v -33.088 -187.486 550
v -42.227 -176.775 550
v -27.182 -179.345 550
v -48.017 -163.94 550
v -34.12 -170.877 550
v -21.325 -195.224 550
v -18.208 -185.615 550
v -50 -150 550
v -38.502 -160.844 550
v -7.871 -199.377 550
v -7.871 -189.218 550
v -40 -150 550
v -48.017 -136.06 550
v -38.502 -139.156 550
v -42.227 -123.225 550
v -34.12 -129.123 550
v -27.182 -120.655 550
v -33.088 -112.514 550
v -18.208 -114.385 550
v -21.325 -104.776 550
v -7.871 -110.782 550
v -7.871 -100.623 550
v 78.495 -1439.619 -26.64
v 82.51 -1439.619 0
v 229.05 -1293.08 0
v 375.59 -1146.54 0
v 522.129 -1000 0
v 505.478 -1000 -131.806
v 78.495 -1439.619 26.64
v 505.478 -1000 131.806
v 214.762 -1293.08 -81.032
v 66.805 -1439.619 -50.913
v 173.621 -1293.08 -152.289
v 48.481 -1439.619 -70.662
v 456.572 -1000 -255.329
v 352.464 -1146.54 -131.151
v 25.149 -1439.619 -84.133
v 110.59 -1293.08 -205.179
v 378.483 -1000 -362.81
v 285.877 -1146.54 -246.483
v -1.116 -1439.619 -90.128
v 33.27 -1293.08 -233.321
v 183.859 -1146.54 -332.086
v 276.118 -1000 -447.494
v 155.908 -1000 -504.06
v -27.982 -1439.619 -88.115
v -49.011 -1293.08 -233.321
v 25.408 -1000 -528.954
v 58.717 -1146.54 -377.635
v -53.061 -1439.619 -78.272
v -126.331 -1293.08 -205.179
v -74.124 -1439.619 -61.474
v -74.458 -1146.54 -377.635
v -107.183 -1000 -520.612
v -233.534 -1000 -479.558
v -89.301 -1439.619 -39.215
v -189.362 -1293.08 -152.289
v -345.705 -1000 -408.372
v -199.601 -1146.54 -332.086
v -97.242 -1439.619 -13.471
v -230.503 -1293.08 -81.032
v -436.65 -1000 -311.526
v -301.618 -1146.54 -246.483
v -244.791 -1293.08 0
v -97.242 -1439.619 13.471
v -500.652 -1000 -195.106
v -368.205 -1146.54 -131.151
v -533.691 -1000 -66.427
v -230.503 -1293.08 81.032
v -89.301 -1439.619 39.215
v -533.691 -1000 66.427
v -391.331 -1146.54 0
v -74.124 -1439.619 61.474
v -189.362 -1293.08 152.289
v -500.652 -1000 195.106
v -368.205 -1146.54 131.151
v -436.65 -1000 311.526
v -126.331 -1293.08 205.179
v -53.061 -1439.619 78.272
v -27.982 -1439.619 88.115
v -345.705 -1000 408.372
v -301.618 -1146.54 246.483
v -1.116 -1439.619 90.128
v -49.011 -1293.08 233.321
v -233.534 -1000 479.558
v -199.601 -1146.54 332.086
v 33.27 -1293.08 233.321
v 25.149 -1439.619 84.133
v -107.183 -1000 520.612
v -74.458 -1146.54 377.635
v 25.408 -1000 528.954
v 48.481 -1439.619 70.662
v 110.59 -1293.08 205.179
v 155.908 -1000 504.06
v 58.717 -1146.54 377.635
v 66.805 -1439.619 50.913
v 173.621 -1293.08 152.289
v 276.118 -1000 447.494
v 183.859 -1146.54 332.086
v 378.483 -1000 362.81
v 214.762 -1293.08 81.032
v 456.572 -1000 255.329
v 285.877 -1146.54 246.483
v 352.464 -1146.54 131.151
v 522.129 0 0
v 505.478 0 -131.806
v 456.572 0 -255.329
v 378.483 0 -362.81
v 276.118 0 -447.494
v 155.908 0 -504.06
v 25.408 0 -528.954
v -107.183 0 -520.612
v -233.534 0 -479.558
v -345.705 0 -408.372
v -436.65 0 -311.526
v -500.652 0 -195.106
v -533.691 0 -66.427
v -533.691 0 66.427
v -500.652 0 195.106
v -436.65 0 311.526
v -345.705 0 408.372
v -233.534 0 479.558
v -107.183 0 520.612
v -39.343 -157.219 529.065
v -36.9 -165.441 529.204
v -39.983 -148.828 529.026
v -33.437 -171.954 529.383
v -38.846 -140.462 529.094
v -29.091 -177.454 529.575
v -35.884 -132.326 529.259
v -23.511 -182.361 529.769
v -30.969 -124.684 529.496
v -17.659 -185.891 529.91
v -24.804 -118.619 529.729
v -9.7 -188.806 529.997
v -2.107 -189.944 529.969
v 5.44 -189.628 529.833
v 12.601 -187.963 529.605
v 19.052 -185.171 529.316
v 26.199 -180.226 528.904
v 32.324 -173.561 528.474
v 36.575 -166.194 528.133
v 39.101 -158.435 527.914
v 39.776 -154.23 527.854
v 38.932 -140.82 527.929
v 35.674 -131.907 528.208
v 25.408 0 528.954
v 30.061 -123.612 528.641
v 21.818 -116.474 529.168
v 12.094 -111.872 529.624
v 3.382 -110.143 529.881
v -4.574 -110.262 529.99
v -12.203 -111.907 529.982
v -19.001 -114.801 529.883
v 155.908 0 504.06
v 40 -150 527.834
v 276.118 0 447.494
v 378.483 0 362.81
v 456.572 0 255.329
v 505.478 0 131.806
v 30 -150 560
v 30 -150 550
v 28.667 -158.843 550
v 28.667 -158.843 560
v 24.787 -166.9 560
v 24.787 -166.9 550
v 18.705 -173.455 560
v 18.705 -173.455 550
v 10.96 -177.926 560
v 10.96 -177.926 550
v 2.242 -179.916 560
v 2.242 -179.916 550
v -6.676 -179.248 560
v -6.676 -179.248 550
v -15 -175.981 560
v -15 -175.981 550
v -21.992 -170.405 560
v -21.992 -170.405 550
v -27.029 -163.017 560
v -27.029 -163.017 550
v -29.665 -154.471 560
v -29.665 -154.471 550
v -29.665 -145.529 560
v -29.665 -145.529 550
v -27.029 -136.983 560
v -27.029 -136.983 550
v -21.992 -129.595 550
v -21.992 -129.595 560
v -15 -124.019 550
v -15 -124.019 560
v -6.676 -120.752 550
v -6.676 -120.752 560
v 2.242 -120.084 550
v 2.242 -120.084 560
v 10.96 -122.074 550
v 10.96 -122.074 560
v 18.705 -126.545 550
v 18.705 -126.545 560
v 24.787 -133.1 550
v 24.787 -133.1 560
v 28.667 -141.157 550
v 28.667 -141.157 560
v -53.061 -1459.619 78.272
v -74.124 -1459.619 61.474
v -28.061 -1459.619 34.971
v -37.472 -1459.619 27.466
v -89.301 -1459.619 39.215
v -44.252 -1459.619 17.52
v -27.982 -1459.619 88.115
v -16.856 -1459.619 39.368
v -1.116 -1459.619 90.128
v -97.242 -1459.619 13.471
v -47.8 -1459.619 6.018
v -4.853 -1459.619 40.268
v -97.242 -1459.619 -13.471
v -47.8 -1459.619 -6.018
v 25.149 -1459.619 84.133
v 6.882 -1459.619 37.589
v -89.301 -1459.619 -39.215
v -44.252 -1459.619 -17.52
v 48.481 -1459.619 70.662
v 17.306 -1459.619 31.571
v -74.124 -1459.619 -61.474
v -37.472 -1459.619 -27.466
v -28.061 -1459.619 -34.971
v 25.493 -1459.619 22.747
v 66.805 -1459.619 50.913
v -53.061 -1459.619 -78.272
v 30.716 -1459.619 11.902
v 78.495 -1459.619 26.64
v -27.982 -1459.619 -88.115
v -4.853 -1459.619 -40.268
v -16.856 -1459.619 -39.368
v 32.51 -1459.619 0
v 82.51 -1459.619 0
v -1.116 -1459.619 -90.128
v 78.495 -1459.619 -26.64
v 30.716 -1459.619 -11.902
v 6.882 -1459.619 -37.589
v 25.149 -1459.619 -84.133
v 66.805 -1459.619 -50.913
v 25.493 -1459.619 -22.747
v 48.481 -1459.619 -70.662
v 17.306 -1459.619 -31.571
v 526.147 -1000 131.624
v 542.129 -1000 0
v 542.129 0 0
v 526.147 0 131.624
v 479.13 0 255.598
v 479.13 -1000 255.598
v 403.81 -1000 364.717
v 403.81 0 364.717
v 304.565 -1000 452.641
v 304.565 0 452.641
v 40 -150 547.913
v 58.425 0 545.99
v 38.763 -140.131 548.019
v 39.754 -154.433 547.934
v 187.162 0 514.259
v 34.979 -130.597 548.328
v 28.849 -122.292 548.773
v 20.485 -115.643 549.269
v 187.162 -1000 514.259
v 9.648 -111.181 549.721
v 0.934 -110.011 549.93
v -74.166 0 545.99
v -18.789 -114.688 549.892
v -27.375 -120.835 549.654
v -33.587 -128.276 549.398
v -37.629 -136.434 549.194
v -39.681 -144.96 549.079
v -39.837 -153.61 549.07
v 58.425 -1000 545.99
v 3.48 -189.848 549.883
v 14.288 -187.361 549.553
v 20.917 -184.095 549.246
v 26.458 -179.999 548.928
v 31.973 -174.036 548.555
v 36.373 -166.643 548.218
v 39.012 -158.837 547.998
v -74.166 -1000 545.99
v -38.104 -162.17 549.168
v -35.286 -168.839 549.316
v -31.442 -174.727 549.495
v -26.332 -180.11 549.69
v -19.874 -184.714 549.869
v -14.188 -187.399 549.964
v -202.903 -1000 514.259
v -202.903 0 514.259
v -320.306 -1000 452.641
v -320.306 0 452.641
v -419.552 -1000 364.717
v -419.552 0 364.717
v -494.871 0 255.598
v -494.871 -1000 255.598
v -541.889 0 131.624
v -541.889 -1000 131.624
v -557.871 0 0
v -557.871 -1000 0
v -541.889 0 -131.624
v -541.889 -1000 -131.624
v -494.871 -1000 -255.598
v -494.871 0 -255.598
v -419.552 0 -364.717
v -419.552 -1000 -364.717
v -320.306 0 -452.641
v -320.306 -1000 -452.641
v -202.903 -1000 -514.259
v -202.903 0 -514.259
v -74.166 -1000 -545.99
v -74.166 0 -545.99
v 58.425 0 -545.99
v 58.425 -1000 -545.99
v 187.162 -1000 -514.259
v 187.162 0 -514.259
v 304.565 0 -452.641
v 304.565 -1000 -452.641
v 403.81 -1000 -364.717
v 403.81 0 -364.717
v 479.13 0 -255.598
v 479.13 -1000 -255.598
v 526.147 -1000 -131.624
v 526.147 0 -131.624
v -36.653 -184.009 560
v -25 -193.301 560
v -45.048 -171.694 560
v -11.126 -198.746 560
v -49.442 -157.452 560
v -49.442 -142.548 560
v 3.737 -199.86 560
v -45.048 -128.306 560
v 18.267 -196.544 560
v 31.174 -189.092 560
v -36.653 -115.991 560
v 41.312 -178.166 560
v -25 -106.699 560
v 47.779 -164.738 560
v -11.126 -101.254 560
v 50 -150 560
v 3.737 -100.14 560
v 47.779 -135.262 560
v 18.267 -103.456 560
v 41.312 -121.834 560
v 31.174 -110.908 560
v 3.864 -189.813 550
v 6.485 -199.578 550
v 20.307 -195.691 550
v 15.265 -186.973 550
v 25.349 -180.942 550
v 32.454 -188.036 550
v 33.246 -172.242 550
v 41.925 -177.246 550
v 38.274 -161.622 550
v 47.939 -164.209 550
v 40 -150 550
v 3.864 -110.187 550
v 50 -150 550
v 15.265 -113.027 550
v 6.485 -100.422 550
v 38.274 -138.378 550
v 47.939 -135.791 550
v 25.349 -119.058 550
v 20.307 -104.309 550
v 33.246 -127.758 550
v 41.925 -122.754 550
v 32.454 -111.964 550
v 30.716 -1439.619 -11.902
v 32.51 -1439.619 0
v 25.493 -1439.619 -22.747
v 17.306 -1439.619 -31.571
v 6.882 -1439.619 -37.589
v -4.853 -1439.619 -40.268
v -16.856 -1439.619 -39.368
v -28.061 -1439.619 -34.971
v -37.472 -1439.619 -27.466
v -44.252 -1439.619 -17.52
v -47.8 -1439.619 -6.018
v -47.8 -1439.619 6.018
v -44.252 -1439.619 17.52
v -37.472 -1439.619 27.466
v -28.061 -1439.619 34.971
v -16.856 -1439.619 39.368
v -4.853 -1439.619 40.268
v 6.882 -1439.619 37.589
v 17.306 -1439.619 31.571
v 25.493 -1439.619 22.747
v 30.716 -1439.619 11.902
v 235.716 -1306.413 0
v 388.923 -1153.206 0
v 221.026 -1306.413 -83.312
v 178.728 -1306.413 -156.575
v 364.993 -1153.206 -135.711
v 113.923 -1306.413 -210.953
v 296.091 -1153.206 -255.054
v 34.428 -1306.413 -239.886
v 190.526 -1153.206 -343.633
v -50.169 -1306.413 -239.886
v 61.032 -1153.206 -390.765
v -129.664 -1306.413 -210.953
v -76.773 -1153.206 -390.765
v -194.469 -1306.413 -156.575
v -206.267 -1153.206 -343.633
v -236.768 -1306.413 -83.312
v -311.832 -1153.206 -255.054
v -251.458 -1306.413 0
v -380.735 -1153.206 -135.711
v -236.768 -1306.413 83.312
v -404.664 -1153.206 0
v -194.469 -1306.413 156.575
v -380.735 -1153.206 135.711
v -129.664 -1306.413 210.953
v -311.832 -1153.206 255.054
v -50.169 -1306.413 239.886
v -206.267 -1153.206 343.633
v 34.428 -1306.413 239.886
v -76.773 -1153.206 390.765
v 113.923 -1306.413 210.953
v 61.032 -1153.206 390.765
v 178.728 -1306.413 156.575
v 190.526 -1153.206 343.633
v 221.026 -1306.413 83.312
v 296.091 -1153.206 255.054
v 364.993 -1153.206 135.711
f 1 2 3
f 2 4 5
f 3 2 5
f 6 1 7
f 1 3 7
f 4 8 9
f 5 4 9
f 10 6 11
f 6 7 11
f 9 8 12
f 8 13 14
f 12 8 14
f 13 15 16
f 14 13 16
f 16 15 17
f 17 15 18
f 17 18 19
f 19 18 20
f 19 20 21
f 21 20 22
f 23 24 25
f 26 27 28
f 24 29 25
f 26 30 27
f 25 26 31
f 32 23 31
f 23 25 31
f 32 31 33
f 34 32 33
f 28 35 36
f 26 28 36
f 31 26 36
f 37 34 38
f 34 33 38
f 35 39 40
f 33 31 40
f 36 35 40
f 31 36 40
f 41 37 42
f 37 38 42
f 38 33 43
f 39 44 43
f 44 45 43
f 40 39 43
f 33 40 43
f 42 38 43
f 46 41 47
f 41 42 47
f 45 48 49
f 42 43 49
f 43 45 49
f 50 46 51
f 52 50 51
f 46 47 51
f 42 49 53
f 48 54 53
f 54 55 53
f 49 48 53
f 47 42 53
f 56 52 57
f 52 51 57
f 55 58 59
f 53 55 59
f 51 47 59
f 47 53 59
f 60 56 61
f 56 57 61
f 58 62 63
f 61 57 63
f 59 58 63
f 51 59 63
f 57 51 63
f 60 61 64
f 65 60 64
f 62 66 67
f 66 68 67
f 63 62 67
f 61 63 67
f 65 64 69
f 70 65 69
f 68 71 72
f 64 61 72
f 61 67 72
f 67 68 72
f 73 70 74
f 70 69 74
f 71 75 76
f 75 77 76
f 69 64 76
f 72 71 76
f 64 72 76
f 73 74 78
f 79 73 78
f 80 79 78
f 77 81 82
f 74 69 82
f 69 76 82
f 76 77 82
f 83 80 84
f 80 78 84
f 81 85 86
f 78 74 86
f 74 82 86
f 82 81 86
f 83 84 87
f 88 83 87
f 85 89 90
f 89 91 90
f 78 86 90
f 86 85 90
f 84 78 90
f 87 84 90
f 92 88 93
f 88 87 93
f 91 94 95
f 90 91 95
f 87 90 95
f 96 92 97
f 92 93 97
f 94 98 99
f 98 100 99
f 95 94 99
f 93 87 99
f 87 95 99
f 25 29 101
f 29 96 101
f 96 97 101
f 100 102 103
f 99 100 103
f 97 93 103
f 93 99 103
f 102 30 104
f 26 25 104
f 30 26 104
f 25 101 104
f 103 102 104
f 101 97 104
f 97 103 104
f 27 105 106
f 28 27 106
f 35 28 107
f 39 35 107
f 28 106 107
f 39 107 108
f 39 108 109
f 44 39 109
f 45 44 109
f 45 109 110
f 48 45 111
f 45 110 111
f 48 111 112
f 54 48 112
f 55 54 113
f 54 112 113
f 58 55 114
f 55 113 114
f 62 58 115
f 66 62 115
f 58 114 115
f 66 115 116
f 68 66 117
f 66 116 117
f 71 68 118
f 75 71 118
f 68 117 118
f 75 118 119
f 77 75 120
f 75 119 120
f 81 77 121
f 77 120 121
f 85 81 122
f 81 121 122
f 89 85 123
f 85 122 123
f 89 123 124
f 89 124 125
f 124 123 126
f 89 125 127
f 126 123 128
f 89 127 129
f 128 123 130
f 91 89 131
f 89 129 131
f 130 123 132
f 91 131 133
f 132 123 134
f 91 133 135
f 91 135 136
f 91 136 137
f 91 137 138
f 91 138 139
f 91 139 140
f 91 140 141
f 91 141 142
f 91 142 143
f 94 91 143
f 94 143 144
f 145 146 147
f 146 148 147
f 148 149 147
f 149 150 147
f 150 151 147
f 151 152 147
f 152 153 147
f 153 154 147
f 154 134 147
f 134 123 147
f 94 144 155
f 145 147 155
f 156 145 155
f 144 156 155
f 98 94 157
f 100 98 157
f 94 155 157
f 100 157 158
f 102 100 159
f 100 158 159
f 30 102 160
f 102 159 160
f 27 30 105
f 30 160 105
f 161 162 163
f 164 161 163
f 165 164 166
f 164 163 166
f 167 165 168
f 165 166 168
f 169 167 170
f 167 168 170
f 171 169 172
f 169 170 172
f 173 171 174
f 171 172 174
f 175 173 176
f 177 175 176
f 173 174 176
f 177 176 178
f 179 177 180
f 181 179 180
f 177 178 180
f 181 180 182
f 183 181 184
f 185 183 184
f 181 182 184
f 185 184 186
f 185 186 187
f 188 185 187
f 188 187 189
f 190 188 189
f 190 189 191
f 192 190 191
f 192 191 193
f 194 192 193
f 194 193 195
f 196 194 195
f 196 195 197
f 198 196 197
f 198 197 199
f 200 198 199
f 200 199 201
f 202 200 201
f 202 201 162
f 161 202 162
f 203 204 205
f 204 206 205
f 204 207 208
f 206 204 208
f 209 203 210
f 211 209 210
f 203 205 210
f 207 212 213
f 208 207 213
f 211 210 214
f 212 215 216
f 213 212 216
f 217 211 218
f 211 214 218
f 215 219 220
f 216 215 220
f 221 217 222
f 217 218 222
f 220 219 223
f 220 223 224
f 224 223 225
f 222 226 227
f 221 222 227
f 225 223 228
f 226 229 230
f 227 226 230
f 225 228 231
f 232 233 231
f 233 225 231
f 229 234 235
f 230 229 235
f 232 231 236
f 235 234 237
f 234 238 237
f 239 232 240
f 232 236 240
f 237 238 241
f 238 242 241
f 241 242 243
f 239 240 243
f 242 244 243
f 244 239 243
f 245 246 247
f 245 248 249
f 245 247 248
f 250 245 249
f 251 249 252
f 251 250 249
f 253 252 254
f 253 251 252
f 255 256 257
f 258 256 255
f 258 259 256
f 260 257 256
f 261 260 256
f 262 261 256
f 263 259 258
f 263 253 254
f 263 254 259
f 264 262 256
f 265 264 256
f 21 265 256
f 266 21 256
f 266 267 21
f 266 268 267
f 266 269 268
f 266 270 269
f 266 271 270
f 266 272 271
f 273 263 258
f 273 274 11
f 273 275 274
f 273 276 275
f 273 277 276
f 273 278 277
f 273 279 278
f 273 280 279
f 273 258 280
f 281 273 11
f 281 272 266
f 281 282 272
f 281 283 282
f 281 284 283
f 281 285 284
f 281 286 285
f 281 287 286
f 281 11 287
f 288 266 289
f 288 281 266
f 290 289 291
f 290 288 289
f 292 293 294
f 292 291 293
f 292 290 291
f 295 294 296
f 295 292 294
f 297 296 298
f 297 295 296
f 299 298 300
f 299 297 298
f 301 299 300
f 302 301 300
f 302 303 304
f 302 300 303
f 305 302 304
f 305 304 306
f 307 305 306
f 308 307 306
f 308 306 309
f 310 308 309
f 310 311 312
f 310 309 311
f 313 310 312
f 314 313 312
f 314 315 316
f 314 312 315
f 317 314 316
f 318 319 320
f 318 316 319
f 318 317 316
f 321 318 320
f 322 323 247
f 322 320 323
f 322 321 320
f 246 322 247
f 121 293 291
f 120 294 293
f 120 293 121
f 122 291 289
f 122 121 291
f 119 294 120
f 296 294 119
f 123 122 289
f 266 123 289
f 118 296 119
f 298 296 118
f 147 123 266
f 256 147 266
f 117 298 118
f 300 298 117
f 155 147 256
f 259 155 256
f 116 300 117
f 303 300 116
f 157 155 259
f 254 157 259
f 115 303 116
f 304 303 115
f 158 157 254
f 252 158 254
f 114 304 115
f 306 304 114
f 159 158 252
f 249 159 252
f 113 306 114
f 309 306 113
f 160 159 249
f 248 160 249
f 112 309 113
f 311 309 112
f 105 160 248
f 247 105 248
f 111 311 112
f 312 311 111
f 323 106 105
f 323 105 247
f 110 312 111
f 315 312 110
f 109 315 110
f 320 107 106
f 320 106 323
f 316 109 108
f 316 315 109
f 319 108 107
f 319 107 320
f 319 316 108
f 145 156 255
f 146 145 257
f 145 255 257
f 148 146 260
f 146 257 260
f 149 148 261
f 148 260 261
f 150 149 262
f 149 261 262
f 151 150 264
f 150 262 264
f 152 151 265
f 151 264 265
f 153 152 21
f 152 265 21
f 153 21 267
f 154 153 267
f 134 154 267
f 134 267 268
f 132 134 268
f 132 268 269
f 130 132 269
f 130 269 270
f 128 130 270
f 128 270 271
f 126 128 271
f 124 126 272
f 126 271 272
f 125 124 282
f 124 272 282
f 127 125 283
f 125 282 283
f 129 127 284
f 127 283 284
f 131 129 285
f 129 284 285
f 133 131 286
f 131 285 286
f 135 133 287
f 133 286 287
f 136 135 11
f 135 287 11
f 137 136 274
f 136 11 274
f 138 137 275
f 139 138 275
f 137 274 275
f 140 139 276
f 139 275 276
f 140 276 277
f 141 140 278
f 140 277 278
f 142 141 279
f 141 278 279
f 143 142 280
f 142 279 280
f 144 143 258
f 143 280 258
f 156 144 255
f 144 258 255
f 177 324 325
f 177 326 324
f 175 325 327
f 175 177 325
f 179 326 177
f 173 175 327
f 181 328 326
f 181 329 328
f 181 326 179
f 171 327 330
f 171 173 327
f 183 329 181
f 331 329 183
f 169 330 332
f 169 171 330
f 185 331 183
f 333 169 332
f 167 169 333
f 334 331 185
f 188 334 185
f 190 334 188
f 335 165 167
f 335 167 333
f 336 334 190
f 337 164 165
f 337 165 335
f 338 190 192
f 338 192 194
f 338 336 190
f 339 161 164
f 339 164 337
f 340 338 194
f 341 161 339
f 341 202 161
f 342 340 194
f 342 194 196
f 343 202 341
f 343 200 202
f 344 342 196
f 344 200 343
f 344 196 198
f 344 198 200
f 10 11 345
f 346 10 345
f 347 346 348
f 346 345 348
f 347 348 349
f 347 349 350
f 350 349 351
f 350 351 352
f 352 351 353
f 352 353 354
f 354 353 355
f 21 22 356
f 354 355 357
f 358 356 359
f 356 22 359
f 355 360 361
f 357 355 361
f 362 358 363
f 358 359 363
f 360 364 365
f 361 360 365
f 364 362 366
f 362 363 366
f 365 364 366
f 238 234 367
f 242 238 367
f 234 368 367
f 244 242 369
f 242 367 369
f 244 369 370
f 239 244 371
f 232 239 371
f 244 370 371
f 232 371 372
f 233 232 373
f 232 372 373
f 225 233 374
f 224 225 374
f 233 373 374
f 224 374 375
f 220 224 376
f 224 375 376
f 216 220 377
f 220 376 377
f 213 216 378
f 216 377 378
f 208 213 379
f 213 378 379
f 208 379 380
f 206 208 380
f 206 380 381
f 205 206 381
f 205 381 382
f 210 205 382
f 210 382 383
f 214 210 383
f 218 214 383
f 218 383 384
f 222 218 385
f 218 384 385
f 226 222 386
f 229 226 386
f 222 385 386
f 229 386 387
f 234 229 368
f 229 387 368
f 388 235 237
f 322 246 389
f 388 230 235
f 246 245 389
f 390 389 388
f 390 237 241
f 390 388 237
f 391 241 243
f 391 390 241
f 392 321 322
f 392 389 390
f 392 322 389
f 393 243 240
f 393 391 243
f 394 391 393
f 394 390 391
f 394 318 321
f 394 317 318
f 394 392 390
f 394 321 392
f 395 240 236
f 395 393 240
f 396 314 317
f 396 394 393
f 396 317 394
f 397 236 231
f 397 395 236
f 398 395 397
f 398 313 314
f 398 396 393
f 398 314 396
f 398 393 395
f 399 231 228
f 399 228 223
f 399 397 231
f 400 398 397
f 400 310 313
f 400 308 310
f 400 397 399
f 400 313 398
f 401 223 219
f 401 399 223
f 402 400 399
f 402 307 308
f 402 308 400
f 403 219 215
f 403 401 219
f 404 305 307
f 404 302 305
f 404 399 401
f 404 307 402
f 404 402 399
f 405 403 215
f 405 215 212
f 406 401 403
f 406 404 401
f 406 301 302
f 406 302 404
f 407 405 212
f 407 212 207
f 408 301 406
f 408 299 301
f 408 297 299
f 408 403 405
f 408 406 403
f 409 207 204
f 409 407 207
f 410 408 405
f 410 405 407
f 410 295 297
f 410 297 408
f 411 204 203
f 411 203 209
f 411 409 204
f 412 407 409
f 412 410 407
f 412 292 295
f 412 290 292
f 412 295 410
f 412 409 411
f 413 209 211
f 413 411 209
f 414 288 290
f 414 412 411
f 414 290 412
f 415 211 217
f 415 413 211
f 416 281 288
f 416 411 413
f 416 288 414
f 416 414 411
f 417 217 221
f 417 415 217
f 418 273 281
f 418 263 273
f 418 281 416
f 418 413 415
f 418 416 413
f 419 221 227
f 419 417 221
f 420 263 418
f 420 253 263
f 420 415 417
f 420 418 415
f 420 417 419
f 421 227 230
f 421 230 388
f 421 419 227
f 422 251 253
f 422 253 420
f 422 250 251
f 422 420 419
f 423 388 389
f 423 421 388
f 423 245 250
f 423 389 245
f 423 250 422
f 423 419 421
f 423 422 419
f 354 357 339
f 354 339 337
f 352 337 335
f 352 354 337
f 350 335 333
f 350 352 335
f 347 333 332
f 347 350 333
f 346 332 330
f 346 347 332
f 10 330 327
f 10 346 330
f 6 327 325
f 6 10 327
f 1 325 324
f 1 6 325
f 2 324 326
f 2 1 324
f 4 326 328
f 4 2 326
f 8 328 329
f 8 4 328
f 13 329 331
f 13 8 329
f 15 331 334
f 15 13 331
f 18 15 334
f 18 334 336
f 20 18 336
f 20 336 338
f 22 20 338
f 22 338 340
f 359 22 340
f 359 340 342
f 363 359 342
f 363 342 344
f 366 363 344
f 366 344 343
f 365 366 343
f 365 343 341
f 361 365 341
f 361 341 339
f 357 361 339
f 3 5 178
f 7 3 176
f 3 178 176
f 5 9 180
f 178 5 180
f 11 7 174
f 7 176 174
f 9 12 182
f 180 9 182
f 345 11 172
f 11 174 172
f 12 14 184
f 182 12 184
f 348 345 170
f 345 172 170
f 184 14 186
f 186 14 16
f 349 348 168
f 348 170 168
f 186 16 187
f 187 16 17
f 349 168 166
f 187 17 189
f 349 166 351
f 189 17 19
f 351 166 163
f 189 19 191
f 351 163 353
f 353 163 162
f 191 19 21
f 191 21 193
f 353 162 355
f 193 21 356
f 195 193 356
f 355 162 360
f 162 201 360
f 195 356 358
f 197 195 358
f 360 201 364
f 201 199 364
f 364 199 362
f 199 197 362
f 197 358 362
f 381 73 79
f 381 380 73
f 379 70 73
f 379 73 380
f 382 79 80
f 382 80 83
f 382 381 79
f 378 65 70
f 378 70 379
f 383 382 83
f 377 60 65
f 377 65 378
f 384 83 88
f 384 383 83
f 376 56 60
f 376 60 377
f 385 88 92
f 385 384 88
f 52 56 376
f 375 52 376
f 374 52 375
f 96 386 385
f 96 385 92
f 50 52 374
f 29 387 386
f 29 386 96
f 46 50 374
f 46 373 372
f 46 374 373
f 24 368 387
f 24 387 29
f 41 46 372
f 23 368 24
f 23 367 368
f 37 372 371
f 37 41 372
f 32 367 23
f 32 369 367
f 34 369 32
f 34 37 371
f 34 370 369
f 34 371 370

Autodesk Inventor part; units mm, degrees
ref_plane "YZ Plane" through (0, 0, 0) normal (1, 0, 0) x (0, 1, 0)
sketch "Sketch1" plane through (0, 0, 0) normal (0, 0, 1) x (1, 0, 0)
  line L0 (542.1294, 0) -> (542.1294, -1000)
  line L1 (542.1294, -1000) -> (82.51, -1459.6194)
  line L2 (-7.8706, -896.0873) -> (-7.8706, -498.6597)
  line L3 (542.1294, 0) -> (542.1294, 0)
  line L4 (82.51, -1459.6194) -> (32.51, -1459.6194)
  line L5 (32.51, -1459.6194) -> (32.51, -1439.6194)
  line L6 (32.51, -1439.6194) -> (82.51, -1439.6194)
  line L7 (82.51, -1439.6194) -> (522.1294, -1000)
  line L8 (522.1294, -1000) -> (522.1294, 0)
  line L9 (522.1294, 0) -> (542.1294, 0)
  point P0 (0, 0)
  dimension "d0" = 1000
  dimension "d1" = 650
  dimension "d2" = 0
  dimension "d3" = 135
  dimension "d4" = 550
  dimension "d29" = 0
  dimension "d30" = 0
  dimension "d31" = 50
  dimension "d41" = 20
ref_plane "Work Plane6" through (-566.8771, -58.4878, 0) normal (0, -1, 0) x (1, 0, 0)
revolve "Revolution1" add sketch "Sketch1" angle 360 about axis through (-7.8706, -896.0873, 0) along (0, 1, 0)
ref_plane "Work Plane10" through (-7.8706, -500, 550) normal (0, 0, 1) x (1, 0, 0)
sketch "Sketch31" plane through (-7.8706, -500, 550) normal (0, 0, 1) x (1, 0, 0)
  circle A0 centre (7.8706, 350) radius 50
  circle A1 centre (7.8706, 350) radius 30
  line L0 (-550, 500) -> (550, 500) projected
  line L1 (7.8706, -1251.5433) -> (7.8706, 791.9239) projected
  point P0 (7.8706, 500)
  dimension "d102" = 100
  dimension "d103" = 60
  dimension "d104" = 150
  dimension "d105" = 0
extrude "Extrusion15" add sketch "Sketch31" along normal blind 10 contours A0 L1 A1 | L1 A1 A0
sketch "Sketch32" plane through (-7.8706, -500, 550) normal (0, 0, 1) x (1, 0, 0)
  circle A0 centre (7.8706, 350) radius 40
  circle A1 centre (7.8706, 350) radius 30 projected
  point P0 (7.8706, 500)
  dimension "d108" = 80
extrude "Extrusion16" cut sketch "Sketch32" against normal blind 50 contours A0 | A1
properties part number "swirl filter"
